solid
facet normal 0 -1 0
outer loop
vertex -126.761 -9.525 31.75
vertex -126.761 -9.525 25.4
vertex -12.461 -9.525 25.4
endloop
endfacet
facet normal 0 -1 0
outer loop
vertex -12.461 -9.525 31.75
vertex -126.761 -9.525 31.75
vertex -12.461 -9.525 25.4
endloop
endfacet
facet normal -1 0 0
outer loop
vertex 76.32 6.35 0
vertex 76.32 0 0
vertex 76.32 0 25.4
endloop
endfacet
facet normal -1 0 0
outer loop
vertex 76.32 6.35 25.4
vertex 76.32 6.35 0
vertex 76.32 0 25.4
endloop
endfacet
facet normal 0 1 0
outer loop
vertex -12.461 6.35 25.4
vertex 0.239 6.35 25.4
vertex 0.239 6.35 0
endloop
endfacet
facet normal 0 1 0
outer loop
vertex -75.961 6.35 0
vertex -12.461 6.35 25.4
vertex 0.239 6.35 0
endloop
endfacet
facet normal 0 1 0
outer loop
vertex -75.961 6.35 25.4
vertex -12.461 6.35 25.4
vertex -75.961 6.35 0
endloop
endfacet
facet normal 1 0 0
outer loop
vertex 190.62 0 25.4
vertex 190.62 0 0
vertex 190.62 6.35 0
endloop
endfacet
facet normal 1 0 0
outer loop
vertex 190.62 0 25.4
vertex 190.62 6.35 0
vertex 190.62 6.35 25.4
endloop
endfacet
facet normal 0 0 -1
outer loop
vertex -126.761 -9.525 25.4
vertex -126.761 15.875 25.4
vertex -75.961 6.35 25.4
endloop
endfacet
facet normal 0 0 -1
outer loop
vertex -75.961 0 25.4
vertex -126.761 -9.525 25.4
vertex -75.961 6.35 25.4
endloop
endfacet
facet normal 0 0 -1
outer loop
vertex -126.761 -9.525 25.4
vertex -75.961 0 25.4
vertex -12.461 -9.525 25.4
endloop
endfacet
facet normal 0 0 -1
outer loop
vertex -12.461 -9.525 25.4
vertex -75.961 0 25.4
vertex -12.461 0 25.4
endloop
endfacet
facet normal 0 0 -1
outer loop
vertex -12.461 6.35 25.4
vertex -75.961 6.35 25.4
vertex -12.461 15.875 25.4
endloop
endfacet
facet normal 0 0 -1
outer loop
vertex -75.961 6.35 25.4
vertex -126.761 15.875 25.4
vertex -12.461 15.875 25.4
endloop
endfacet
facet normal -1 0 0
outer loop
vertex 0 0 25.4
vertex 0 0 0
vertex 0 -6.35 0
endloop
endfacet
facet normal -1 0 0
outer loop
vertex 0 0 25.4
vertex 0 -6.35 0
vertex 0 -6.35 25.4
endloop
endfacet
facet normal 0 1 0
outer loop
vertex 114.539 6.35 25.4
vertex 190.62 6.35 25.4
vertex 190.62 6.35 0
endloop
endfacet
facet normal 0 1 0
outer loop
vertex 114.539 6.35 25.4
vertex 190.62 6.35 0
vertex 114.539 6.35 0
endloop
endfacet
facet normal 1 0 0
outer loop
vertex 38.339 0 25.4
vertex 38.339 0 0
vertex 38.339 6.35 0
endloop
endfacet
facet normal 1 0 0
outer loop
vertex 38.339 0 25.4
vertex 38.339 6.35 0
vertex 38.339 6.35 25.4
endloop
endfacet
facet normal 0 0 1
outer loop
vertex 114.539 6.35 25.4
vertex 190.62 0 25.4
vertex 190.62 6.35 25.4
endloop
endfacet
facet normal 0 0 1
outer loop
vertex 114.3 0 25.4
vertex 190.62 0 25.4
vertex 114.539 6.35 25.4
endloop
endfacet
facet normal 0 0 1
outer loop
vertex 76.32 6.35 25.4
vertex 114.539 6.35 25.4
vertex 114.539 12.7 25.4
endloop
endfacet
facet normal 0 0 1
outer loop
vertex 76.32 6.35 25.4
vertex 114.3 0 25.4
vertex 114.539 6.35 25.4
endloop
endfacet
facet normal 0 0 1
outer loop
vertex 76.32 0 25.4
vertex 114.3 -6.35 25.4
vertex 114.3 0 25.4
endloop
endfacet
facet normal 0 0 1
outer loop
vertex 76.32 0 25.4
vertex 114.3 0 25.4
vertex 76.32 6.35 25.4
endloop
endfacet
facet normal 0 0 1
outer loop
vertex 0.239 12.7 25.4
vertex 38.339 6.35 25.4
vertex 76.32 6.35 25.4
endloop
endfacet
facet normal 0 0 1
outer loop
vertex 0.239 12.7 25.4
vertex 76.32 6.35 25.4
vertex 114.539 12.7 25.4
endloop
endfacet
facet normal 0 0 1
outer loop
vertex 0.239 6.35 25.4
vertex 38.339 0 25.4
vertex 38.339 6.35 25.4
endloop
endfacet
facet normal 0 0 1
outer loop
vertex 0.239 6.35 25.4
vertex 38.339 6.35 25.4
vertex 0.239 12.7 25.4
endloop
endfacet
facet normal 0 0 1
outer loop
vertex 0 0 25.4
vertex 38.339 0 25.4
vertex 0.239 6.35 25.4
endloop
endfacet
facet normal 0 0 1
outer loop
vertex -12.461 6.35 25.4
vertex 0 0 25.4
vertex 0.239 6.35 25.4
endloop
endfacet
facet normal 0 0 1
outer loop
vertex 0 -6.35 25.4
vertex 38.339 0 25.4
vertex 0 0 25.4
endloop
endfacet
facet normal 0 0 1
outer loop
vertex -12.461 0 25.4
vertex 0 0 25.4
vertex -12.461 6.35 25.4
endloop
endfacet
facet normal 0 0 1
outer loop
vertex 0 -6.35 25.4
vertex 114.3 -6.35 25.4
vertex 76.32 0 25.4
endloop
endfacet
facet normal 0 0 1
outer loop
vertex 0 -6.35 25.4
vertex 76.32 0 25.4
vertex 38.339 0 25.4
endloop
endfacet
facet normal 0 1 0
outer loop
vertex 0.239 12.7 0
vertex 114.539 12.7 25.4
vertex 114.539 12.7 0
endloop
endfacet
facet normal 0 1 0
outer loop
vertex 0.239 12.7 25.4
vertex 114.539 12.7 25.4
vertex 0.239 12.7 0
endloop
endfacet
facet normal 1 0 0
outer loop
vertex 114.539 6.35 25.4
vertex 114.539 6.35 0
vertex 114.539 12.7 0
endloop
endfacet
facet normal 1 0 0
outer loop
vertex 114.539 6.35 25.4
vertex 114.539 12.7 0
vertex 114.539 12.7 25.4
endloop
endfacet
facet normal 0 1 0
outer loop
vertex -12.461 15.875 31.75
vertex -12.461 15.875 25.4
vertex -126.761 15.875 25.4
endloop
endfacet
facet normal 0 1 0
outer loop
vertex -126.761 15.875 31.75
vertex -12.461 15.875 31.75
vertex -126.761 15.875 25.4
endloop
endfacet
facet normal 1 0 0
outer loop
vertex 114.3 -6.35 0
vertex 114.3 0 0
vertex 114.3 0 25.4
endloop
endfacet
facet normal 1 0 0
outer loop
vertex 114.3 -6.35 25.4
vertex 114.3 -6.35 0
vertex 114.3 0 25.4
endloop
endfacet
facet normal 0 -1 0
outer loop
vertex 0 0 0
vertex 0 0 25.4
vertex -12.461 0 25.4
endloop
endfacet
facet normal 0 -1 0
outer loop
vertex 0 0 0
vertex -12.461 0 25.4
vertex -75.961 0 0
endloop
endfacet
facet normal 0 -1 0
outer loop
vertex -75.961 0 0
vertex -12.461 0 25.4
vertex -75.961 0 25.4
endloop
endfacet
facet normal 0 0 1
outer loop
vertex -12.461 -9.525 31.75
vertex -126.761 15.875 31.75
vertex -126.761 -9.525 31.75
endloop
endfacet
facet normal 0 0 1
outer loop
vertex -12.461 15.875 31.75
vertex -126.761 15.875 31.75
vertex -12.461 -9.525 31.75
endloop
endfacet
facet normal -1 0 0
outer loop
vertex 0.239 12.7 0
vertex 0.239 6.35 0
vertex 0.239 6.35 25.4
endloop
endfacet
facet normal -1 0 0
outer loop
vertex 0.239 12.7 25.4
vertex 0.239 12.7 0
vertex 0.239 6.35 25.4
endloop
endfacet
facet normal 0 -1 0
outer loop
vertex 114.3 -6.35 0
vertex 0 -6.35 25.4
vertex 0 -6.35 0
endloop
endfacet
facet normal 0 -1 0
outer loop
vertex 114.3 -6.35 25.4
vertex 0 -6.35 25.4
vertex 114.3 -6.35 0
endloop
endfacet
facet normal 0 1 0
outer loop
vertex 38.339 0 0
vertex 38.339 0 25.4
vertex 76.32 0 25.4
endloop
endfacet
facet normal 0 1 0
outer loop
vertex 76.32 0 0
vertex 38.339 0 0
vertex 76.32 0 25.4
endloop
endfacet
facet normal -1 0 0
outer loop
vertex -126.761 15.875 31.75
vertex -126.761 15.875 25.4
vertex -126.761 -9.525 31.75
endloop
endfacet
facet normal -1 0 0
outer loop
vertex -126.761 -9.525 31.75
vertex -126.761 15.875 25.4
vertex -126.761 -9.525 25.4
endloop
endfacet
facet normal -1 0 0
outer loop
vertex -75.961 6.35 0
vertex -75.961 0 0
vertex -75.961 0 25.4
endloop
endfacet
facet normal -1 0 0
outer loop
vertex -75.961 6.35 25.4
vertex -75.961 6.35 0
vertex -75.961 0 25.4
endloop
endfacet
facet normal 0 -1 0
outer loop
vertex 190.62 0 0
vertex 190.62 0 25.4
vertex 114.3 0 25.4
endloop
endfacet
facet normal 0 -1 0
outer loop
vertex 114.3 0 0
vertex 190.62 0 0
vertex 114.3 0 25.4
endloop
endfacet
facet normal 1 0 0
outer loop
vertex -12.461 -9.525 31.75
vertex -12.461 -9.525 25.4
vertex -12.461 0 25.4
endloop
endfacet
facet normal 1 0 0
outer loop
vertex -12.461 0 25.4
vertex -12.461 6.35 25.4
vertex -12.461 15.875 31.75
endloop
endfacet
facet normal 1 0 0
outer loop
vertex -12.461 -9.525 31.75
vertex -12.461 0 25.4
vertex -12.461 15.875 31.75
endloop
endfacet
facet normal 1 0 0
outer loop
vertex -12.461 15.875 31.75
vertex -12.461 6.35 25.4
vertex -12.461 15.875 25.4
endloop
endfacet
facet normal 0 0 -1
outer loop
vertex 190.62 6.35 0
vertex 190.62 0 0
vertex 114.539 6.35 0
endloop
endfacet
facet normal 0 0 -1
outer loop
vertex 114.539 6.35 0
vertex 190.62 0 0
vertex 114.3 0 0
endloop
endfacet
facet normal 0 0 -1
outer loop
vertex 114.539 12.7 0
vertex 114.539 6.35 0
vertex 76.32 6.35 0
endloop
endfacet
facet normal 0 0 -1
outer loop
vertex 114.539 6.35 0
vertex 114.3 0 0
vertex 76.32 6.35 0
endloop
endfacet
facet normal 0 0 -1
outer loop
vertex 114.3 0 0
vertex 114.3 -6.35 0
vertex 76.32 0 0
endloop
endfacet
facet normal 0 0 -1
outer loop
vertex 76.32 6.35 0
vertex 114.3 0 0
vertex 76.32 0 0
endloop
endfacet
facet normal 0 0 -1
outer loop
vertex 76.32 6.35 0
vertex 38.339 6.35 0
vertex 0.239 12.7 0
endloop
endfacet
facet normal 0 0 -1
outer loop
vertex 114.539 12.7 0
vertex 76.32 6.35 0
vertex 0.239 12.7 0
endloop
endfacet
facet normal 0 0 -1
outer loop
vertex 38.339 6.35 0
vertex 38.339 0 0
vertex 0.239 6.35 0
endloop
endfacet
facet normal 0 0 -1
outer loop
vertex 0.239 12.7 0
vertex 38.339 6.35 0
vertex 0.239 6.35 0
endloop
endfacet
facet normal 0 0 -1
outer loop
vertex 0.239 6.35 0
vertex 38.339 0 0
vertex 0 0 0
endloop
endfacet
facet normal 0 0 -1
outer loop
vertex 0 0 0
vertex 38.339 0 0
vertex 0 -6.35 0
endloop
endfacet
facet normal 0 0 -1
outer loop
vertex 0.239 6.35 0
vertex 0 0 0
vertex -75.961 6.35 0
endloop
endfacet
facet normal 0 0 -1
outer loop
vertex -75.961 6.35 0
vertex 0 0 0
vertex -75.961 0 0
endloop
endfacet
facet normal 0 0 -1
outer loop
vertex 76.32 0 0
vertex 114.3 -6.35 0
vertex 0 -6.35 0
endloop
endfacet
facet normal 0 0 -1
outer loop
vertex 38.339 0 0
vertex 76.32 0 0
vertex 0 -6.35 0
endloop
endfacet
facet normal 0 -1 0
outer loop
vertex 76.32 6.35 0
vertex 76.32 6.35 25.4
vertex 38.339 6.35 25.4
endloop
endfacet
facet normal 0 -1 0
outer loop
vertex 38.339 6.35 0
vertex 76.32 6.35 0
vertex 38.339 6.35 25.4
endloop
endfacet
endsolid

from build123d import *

# Parameters (mm, degrees)
F0_W     = 114.3
F0_H     = 25.4
F1_DEPTH = 6.35
F2_W     = 114.3
F2_H     = 25.4
F3_DEPTH = 6.35
F4_W     = 114.3
F4_H     = 25.4
F5_DEPTH = 6.35
F6_W     = 114.3
F6_H     = 25.4
F7_DEPTH = 6.35
F9_DEPTH = 6.35


with BuildPart() as f1:
    # F0 (on Front) → F1 (new body)
    with BuildSketch(Plane.XZ):
        with Locations((57.15, 12.7)):
            Rectangle(F0_W, F0_H)
    extrude(amount=F1_DEPTH)

    # F2 (on face) → F3 (join)
    with BuildSketch(Plane(origin=(0, 0, 0), x_dir=(-1, 0, 0), z_dir=(0, 1, 0))):
        with Locations((18.810974, 12.7)):
            Rectangle(F2_W, F2_H)
    extrude(amount=F3_DEPTH)

    # F4 (on face) → F5 (join)
    with BuildSketch(Plane(origin=(0, 6.35, 0), x_dir=(-1, 0, 0), z_dir=(0, 1, 0))):
        with Locations((-57.389026, 12.7)):
            Rectangle(F4_W, F4_H)
    extrude(amount=F5_DEPTH)

    # F6 (on face) → F7 (join)
    with BuildSketch(Plane(origin=(0, 0, 0), x_dir=(-1, 0, 0), z_dir=(0, 1, 0))):
        with Locations((-133.469513, 12.7)):
            Rectangle(F6_W, F6_H)
    extrude(amount=F7_DEPTH)

    # F8 (on face) → F9 (join)
    with BuildSketch(Plane.XY.offset(25.4)):
        Polygon((-126.760974, 3.175), (-85.020583, 3.175), (-12.460974, 3.175), (-12.460974, 15.875), (-126.760974, 15.875), align=None)
        Polygon((-12.460974, 3.175), (-85.020583, 3.175), (-126.760974, 3.175), (-126.760974, -9.525), (-12.460974, -9.525), align=None)
    extrude(amount=F9_DEPTH)


solid = f1.part
